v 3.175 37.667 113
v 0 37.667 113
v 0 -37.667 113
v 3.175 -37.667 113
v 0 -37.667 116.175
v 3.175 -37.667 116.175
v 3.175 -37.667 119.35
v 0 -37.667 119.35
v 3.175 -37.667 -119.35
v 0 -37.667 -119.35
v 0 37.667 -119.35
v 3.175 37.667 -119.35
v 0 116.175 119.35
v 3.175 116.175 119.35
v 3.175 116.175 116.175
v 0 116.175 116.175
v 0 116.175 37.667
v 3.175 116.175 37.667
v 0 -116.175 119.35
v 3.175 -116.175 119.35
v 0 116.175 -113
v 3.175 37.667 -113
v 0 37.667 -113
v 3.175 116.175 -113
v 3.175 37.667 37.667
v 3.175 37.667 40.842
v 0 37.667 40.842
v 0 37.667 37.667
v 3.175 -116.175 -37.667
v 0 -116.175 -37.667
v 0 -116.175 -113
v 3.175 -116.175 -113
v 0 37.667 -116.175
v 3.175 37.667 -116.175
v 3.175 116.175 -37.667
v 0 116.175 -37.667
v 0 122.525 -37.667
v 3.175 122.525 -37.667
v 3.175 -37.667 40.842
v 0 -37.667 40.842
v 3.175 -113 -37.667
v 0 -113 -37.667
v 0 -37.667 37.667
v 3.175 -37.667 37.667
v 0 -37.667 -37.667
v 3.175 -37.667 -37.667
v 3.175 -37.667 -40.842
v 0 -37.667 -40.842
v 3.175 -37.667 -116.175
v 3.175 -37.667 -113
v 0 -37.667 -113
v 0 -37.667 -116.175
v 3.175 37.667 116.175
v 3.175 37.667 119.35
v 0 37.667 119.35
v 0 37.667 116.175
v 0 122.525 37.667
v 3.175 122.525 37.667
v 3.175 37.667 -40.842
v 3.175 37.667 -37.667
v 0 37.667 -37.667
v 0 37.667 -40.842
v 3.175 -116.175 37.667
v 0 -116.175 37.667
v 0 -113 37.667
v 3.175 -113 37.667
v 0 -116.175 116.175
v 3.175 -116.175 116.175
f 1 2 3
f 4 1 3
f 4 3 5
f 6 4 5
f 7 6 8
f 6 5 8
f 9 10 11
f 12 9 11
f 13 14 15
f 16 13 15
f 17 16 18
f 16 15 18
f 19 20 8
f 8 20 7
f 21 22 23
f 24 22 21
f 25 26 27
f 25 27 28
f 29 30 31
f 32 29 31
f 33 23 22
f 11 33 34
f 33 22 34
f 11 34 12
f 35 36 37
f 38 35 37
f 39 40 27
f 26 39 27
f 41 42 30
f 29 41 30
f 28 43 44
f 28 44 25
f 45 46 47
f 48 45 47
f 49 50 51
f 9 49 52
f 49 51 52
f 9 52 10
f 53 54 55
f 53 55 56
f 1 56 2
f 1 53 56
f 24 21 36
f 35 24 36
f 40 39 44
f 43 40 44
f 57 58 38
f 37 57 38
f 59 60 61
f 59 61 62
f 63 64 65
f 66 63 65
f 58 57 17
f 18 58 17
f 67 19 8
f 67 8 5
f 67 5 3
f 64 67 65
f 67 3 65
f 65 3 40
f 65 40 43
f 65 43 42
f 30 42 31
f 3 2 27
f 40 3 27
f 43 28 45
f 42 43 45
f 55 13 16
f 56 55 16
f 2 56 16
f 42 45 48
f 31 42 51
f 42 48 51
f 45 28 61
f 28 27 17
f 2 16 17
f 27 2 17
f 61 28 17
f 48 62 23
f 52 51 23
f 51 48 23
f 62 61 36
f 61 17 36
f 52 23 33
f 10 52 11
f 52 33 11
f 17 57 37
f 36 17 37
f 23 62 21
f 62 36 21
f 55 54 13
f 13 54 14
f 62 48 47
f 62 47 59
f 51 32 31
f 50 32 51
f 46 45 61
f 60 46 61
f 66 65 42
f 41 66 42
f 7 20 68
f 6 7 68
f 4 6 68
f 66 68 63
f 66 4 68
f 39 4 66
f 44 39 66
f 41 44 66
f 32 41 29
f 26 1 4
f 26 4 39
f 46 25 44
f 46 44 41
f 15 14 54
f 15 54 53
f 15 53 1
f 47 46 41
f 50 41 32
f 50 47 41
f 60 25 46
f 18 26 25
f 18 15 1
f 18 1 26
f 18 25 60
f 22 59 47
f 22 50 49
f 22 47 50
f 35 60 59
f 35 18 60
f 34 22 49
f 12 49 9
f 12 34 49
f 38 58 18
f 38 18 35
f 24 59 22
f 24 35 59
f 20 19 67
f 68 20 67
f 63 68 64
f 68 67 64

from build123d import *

# Parameters (mm, degrees)
SKETCH2_W           = 3.175
SKETCH2_H           = 75.333333334
BOSS_EXTRUDE1_DEPTH = 3.175
SKETCH3_W           = 3.175
SKETCH3_H           = 78.508333333
SKETCH3_W_2         = 75.333333334
SKETCH3_H_2         = 3.175
BOSS_EXTRUDE2_DEPTH = 3.175
SKETCH4_W           = 3.175
SKETCH4_H           = 78.508333333
CUT_EXTRUDE1_DEPTH  = 3.175


with BuildPart() as part:
    # Sketch2 → Boss-Extrude1 (new body)
    with BuildSketch(Plane(origin=(0, 0, 0), x_dir=(0, 0, -1), z_dir=(1, 0, 0))):
        Polygon((-113, 37.666666667), (-113, -37.666666667), (-116.175, -37.666666667), (-116.175, -116.175), (-37.666666667, -116.175), (-37.666666667, -113), (37.666666667, -113), (37.666666667, -116.175), (116.175, -116.175), (116.175, -37.666666667), (119.35, -37.666666667), (119.35, 37.666666667), (116.175, 37.666666667), (116.175, 116.175), (37.666666667, 116.175), (37.666666667, 119.35), (-37.666666667, 119.35), (-37.666666667, 116.175), (-116.175, 116.175), (-116.175, 37.666666667), align=None)
        with Locations((39.254166667, 0)):
            Rectangle(SKETCH2_W, SKETCH2_H, mode=Mode.SUBTRACT)
        with Locations((-39.254166667, 0)):
            Rectangle(SKETCH2_W, SKETCH2_H, mode=Mode.SUBTRACT)
    extrude(amount=BOSS_EXTRUDE1_DEPTH)

    # Sketch3 → Boss-Extrude2 (add)
    with BuildSketch(Plane(origin=(3.175, 0, 0), x_dir=(0, 0, -1), z_dir=(1, 0, 0))):
        with Locations((-117.7625, 76.920833334)):
            Rectangle(SKETCH3_W, SKETCH3_H)
        with Locations((-117.7625, -76.920833334)):
            Rectangle(SKETCH3_W, SKETCH3_H)
        with Locations((0, 120.9375)):
            Rectangle(SKETCH3_W_2, SKETCH3_H_2)
    extrude(amount=-BOSS_EXTRUDE2_DEPTH)

    # Sketch4 → Cut-Extrude1 (cut)
    with BuildSketch(Plane(origin=(3.175, 0, 0), x_dir=(0, 0, -1), z_dir=(1, 0, 0))):
        with Locations((114.5875, 76.920833334)):
            Rectangle(SKETCH4_W, SKETCH4_H)
        with Locations((114.5875, -76.920833334)):
            Rectangle(SKETCH4_W, SKETCH4_H)
    extrude(amount=-CUT_EXTRUDE1_DEPTH, mode=Mode.SUBTRACT)


solid = part.part
